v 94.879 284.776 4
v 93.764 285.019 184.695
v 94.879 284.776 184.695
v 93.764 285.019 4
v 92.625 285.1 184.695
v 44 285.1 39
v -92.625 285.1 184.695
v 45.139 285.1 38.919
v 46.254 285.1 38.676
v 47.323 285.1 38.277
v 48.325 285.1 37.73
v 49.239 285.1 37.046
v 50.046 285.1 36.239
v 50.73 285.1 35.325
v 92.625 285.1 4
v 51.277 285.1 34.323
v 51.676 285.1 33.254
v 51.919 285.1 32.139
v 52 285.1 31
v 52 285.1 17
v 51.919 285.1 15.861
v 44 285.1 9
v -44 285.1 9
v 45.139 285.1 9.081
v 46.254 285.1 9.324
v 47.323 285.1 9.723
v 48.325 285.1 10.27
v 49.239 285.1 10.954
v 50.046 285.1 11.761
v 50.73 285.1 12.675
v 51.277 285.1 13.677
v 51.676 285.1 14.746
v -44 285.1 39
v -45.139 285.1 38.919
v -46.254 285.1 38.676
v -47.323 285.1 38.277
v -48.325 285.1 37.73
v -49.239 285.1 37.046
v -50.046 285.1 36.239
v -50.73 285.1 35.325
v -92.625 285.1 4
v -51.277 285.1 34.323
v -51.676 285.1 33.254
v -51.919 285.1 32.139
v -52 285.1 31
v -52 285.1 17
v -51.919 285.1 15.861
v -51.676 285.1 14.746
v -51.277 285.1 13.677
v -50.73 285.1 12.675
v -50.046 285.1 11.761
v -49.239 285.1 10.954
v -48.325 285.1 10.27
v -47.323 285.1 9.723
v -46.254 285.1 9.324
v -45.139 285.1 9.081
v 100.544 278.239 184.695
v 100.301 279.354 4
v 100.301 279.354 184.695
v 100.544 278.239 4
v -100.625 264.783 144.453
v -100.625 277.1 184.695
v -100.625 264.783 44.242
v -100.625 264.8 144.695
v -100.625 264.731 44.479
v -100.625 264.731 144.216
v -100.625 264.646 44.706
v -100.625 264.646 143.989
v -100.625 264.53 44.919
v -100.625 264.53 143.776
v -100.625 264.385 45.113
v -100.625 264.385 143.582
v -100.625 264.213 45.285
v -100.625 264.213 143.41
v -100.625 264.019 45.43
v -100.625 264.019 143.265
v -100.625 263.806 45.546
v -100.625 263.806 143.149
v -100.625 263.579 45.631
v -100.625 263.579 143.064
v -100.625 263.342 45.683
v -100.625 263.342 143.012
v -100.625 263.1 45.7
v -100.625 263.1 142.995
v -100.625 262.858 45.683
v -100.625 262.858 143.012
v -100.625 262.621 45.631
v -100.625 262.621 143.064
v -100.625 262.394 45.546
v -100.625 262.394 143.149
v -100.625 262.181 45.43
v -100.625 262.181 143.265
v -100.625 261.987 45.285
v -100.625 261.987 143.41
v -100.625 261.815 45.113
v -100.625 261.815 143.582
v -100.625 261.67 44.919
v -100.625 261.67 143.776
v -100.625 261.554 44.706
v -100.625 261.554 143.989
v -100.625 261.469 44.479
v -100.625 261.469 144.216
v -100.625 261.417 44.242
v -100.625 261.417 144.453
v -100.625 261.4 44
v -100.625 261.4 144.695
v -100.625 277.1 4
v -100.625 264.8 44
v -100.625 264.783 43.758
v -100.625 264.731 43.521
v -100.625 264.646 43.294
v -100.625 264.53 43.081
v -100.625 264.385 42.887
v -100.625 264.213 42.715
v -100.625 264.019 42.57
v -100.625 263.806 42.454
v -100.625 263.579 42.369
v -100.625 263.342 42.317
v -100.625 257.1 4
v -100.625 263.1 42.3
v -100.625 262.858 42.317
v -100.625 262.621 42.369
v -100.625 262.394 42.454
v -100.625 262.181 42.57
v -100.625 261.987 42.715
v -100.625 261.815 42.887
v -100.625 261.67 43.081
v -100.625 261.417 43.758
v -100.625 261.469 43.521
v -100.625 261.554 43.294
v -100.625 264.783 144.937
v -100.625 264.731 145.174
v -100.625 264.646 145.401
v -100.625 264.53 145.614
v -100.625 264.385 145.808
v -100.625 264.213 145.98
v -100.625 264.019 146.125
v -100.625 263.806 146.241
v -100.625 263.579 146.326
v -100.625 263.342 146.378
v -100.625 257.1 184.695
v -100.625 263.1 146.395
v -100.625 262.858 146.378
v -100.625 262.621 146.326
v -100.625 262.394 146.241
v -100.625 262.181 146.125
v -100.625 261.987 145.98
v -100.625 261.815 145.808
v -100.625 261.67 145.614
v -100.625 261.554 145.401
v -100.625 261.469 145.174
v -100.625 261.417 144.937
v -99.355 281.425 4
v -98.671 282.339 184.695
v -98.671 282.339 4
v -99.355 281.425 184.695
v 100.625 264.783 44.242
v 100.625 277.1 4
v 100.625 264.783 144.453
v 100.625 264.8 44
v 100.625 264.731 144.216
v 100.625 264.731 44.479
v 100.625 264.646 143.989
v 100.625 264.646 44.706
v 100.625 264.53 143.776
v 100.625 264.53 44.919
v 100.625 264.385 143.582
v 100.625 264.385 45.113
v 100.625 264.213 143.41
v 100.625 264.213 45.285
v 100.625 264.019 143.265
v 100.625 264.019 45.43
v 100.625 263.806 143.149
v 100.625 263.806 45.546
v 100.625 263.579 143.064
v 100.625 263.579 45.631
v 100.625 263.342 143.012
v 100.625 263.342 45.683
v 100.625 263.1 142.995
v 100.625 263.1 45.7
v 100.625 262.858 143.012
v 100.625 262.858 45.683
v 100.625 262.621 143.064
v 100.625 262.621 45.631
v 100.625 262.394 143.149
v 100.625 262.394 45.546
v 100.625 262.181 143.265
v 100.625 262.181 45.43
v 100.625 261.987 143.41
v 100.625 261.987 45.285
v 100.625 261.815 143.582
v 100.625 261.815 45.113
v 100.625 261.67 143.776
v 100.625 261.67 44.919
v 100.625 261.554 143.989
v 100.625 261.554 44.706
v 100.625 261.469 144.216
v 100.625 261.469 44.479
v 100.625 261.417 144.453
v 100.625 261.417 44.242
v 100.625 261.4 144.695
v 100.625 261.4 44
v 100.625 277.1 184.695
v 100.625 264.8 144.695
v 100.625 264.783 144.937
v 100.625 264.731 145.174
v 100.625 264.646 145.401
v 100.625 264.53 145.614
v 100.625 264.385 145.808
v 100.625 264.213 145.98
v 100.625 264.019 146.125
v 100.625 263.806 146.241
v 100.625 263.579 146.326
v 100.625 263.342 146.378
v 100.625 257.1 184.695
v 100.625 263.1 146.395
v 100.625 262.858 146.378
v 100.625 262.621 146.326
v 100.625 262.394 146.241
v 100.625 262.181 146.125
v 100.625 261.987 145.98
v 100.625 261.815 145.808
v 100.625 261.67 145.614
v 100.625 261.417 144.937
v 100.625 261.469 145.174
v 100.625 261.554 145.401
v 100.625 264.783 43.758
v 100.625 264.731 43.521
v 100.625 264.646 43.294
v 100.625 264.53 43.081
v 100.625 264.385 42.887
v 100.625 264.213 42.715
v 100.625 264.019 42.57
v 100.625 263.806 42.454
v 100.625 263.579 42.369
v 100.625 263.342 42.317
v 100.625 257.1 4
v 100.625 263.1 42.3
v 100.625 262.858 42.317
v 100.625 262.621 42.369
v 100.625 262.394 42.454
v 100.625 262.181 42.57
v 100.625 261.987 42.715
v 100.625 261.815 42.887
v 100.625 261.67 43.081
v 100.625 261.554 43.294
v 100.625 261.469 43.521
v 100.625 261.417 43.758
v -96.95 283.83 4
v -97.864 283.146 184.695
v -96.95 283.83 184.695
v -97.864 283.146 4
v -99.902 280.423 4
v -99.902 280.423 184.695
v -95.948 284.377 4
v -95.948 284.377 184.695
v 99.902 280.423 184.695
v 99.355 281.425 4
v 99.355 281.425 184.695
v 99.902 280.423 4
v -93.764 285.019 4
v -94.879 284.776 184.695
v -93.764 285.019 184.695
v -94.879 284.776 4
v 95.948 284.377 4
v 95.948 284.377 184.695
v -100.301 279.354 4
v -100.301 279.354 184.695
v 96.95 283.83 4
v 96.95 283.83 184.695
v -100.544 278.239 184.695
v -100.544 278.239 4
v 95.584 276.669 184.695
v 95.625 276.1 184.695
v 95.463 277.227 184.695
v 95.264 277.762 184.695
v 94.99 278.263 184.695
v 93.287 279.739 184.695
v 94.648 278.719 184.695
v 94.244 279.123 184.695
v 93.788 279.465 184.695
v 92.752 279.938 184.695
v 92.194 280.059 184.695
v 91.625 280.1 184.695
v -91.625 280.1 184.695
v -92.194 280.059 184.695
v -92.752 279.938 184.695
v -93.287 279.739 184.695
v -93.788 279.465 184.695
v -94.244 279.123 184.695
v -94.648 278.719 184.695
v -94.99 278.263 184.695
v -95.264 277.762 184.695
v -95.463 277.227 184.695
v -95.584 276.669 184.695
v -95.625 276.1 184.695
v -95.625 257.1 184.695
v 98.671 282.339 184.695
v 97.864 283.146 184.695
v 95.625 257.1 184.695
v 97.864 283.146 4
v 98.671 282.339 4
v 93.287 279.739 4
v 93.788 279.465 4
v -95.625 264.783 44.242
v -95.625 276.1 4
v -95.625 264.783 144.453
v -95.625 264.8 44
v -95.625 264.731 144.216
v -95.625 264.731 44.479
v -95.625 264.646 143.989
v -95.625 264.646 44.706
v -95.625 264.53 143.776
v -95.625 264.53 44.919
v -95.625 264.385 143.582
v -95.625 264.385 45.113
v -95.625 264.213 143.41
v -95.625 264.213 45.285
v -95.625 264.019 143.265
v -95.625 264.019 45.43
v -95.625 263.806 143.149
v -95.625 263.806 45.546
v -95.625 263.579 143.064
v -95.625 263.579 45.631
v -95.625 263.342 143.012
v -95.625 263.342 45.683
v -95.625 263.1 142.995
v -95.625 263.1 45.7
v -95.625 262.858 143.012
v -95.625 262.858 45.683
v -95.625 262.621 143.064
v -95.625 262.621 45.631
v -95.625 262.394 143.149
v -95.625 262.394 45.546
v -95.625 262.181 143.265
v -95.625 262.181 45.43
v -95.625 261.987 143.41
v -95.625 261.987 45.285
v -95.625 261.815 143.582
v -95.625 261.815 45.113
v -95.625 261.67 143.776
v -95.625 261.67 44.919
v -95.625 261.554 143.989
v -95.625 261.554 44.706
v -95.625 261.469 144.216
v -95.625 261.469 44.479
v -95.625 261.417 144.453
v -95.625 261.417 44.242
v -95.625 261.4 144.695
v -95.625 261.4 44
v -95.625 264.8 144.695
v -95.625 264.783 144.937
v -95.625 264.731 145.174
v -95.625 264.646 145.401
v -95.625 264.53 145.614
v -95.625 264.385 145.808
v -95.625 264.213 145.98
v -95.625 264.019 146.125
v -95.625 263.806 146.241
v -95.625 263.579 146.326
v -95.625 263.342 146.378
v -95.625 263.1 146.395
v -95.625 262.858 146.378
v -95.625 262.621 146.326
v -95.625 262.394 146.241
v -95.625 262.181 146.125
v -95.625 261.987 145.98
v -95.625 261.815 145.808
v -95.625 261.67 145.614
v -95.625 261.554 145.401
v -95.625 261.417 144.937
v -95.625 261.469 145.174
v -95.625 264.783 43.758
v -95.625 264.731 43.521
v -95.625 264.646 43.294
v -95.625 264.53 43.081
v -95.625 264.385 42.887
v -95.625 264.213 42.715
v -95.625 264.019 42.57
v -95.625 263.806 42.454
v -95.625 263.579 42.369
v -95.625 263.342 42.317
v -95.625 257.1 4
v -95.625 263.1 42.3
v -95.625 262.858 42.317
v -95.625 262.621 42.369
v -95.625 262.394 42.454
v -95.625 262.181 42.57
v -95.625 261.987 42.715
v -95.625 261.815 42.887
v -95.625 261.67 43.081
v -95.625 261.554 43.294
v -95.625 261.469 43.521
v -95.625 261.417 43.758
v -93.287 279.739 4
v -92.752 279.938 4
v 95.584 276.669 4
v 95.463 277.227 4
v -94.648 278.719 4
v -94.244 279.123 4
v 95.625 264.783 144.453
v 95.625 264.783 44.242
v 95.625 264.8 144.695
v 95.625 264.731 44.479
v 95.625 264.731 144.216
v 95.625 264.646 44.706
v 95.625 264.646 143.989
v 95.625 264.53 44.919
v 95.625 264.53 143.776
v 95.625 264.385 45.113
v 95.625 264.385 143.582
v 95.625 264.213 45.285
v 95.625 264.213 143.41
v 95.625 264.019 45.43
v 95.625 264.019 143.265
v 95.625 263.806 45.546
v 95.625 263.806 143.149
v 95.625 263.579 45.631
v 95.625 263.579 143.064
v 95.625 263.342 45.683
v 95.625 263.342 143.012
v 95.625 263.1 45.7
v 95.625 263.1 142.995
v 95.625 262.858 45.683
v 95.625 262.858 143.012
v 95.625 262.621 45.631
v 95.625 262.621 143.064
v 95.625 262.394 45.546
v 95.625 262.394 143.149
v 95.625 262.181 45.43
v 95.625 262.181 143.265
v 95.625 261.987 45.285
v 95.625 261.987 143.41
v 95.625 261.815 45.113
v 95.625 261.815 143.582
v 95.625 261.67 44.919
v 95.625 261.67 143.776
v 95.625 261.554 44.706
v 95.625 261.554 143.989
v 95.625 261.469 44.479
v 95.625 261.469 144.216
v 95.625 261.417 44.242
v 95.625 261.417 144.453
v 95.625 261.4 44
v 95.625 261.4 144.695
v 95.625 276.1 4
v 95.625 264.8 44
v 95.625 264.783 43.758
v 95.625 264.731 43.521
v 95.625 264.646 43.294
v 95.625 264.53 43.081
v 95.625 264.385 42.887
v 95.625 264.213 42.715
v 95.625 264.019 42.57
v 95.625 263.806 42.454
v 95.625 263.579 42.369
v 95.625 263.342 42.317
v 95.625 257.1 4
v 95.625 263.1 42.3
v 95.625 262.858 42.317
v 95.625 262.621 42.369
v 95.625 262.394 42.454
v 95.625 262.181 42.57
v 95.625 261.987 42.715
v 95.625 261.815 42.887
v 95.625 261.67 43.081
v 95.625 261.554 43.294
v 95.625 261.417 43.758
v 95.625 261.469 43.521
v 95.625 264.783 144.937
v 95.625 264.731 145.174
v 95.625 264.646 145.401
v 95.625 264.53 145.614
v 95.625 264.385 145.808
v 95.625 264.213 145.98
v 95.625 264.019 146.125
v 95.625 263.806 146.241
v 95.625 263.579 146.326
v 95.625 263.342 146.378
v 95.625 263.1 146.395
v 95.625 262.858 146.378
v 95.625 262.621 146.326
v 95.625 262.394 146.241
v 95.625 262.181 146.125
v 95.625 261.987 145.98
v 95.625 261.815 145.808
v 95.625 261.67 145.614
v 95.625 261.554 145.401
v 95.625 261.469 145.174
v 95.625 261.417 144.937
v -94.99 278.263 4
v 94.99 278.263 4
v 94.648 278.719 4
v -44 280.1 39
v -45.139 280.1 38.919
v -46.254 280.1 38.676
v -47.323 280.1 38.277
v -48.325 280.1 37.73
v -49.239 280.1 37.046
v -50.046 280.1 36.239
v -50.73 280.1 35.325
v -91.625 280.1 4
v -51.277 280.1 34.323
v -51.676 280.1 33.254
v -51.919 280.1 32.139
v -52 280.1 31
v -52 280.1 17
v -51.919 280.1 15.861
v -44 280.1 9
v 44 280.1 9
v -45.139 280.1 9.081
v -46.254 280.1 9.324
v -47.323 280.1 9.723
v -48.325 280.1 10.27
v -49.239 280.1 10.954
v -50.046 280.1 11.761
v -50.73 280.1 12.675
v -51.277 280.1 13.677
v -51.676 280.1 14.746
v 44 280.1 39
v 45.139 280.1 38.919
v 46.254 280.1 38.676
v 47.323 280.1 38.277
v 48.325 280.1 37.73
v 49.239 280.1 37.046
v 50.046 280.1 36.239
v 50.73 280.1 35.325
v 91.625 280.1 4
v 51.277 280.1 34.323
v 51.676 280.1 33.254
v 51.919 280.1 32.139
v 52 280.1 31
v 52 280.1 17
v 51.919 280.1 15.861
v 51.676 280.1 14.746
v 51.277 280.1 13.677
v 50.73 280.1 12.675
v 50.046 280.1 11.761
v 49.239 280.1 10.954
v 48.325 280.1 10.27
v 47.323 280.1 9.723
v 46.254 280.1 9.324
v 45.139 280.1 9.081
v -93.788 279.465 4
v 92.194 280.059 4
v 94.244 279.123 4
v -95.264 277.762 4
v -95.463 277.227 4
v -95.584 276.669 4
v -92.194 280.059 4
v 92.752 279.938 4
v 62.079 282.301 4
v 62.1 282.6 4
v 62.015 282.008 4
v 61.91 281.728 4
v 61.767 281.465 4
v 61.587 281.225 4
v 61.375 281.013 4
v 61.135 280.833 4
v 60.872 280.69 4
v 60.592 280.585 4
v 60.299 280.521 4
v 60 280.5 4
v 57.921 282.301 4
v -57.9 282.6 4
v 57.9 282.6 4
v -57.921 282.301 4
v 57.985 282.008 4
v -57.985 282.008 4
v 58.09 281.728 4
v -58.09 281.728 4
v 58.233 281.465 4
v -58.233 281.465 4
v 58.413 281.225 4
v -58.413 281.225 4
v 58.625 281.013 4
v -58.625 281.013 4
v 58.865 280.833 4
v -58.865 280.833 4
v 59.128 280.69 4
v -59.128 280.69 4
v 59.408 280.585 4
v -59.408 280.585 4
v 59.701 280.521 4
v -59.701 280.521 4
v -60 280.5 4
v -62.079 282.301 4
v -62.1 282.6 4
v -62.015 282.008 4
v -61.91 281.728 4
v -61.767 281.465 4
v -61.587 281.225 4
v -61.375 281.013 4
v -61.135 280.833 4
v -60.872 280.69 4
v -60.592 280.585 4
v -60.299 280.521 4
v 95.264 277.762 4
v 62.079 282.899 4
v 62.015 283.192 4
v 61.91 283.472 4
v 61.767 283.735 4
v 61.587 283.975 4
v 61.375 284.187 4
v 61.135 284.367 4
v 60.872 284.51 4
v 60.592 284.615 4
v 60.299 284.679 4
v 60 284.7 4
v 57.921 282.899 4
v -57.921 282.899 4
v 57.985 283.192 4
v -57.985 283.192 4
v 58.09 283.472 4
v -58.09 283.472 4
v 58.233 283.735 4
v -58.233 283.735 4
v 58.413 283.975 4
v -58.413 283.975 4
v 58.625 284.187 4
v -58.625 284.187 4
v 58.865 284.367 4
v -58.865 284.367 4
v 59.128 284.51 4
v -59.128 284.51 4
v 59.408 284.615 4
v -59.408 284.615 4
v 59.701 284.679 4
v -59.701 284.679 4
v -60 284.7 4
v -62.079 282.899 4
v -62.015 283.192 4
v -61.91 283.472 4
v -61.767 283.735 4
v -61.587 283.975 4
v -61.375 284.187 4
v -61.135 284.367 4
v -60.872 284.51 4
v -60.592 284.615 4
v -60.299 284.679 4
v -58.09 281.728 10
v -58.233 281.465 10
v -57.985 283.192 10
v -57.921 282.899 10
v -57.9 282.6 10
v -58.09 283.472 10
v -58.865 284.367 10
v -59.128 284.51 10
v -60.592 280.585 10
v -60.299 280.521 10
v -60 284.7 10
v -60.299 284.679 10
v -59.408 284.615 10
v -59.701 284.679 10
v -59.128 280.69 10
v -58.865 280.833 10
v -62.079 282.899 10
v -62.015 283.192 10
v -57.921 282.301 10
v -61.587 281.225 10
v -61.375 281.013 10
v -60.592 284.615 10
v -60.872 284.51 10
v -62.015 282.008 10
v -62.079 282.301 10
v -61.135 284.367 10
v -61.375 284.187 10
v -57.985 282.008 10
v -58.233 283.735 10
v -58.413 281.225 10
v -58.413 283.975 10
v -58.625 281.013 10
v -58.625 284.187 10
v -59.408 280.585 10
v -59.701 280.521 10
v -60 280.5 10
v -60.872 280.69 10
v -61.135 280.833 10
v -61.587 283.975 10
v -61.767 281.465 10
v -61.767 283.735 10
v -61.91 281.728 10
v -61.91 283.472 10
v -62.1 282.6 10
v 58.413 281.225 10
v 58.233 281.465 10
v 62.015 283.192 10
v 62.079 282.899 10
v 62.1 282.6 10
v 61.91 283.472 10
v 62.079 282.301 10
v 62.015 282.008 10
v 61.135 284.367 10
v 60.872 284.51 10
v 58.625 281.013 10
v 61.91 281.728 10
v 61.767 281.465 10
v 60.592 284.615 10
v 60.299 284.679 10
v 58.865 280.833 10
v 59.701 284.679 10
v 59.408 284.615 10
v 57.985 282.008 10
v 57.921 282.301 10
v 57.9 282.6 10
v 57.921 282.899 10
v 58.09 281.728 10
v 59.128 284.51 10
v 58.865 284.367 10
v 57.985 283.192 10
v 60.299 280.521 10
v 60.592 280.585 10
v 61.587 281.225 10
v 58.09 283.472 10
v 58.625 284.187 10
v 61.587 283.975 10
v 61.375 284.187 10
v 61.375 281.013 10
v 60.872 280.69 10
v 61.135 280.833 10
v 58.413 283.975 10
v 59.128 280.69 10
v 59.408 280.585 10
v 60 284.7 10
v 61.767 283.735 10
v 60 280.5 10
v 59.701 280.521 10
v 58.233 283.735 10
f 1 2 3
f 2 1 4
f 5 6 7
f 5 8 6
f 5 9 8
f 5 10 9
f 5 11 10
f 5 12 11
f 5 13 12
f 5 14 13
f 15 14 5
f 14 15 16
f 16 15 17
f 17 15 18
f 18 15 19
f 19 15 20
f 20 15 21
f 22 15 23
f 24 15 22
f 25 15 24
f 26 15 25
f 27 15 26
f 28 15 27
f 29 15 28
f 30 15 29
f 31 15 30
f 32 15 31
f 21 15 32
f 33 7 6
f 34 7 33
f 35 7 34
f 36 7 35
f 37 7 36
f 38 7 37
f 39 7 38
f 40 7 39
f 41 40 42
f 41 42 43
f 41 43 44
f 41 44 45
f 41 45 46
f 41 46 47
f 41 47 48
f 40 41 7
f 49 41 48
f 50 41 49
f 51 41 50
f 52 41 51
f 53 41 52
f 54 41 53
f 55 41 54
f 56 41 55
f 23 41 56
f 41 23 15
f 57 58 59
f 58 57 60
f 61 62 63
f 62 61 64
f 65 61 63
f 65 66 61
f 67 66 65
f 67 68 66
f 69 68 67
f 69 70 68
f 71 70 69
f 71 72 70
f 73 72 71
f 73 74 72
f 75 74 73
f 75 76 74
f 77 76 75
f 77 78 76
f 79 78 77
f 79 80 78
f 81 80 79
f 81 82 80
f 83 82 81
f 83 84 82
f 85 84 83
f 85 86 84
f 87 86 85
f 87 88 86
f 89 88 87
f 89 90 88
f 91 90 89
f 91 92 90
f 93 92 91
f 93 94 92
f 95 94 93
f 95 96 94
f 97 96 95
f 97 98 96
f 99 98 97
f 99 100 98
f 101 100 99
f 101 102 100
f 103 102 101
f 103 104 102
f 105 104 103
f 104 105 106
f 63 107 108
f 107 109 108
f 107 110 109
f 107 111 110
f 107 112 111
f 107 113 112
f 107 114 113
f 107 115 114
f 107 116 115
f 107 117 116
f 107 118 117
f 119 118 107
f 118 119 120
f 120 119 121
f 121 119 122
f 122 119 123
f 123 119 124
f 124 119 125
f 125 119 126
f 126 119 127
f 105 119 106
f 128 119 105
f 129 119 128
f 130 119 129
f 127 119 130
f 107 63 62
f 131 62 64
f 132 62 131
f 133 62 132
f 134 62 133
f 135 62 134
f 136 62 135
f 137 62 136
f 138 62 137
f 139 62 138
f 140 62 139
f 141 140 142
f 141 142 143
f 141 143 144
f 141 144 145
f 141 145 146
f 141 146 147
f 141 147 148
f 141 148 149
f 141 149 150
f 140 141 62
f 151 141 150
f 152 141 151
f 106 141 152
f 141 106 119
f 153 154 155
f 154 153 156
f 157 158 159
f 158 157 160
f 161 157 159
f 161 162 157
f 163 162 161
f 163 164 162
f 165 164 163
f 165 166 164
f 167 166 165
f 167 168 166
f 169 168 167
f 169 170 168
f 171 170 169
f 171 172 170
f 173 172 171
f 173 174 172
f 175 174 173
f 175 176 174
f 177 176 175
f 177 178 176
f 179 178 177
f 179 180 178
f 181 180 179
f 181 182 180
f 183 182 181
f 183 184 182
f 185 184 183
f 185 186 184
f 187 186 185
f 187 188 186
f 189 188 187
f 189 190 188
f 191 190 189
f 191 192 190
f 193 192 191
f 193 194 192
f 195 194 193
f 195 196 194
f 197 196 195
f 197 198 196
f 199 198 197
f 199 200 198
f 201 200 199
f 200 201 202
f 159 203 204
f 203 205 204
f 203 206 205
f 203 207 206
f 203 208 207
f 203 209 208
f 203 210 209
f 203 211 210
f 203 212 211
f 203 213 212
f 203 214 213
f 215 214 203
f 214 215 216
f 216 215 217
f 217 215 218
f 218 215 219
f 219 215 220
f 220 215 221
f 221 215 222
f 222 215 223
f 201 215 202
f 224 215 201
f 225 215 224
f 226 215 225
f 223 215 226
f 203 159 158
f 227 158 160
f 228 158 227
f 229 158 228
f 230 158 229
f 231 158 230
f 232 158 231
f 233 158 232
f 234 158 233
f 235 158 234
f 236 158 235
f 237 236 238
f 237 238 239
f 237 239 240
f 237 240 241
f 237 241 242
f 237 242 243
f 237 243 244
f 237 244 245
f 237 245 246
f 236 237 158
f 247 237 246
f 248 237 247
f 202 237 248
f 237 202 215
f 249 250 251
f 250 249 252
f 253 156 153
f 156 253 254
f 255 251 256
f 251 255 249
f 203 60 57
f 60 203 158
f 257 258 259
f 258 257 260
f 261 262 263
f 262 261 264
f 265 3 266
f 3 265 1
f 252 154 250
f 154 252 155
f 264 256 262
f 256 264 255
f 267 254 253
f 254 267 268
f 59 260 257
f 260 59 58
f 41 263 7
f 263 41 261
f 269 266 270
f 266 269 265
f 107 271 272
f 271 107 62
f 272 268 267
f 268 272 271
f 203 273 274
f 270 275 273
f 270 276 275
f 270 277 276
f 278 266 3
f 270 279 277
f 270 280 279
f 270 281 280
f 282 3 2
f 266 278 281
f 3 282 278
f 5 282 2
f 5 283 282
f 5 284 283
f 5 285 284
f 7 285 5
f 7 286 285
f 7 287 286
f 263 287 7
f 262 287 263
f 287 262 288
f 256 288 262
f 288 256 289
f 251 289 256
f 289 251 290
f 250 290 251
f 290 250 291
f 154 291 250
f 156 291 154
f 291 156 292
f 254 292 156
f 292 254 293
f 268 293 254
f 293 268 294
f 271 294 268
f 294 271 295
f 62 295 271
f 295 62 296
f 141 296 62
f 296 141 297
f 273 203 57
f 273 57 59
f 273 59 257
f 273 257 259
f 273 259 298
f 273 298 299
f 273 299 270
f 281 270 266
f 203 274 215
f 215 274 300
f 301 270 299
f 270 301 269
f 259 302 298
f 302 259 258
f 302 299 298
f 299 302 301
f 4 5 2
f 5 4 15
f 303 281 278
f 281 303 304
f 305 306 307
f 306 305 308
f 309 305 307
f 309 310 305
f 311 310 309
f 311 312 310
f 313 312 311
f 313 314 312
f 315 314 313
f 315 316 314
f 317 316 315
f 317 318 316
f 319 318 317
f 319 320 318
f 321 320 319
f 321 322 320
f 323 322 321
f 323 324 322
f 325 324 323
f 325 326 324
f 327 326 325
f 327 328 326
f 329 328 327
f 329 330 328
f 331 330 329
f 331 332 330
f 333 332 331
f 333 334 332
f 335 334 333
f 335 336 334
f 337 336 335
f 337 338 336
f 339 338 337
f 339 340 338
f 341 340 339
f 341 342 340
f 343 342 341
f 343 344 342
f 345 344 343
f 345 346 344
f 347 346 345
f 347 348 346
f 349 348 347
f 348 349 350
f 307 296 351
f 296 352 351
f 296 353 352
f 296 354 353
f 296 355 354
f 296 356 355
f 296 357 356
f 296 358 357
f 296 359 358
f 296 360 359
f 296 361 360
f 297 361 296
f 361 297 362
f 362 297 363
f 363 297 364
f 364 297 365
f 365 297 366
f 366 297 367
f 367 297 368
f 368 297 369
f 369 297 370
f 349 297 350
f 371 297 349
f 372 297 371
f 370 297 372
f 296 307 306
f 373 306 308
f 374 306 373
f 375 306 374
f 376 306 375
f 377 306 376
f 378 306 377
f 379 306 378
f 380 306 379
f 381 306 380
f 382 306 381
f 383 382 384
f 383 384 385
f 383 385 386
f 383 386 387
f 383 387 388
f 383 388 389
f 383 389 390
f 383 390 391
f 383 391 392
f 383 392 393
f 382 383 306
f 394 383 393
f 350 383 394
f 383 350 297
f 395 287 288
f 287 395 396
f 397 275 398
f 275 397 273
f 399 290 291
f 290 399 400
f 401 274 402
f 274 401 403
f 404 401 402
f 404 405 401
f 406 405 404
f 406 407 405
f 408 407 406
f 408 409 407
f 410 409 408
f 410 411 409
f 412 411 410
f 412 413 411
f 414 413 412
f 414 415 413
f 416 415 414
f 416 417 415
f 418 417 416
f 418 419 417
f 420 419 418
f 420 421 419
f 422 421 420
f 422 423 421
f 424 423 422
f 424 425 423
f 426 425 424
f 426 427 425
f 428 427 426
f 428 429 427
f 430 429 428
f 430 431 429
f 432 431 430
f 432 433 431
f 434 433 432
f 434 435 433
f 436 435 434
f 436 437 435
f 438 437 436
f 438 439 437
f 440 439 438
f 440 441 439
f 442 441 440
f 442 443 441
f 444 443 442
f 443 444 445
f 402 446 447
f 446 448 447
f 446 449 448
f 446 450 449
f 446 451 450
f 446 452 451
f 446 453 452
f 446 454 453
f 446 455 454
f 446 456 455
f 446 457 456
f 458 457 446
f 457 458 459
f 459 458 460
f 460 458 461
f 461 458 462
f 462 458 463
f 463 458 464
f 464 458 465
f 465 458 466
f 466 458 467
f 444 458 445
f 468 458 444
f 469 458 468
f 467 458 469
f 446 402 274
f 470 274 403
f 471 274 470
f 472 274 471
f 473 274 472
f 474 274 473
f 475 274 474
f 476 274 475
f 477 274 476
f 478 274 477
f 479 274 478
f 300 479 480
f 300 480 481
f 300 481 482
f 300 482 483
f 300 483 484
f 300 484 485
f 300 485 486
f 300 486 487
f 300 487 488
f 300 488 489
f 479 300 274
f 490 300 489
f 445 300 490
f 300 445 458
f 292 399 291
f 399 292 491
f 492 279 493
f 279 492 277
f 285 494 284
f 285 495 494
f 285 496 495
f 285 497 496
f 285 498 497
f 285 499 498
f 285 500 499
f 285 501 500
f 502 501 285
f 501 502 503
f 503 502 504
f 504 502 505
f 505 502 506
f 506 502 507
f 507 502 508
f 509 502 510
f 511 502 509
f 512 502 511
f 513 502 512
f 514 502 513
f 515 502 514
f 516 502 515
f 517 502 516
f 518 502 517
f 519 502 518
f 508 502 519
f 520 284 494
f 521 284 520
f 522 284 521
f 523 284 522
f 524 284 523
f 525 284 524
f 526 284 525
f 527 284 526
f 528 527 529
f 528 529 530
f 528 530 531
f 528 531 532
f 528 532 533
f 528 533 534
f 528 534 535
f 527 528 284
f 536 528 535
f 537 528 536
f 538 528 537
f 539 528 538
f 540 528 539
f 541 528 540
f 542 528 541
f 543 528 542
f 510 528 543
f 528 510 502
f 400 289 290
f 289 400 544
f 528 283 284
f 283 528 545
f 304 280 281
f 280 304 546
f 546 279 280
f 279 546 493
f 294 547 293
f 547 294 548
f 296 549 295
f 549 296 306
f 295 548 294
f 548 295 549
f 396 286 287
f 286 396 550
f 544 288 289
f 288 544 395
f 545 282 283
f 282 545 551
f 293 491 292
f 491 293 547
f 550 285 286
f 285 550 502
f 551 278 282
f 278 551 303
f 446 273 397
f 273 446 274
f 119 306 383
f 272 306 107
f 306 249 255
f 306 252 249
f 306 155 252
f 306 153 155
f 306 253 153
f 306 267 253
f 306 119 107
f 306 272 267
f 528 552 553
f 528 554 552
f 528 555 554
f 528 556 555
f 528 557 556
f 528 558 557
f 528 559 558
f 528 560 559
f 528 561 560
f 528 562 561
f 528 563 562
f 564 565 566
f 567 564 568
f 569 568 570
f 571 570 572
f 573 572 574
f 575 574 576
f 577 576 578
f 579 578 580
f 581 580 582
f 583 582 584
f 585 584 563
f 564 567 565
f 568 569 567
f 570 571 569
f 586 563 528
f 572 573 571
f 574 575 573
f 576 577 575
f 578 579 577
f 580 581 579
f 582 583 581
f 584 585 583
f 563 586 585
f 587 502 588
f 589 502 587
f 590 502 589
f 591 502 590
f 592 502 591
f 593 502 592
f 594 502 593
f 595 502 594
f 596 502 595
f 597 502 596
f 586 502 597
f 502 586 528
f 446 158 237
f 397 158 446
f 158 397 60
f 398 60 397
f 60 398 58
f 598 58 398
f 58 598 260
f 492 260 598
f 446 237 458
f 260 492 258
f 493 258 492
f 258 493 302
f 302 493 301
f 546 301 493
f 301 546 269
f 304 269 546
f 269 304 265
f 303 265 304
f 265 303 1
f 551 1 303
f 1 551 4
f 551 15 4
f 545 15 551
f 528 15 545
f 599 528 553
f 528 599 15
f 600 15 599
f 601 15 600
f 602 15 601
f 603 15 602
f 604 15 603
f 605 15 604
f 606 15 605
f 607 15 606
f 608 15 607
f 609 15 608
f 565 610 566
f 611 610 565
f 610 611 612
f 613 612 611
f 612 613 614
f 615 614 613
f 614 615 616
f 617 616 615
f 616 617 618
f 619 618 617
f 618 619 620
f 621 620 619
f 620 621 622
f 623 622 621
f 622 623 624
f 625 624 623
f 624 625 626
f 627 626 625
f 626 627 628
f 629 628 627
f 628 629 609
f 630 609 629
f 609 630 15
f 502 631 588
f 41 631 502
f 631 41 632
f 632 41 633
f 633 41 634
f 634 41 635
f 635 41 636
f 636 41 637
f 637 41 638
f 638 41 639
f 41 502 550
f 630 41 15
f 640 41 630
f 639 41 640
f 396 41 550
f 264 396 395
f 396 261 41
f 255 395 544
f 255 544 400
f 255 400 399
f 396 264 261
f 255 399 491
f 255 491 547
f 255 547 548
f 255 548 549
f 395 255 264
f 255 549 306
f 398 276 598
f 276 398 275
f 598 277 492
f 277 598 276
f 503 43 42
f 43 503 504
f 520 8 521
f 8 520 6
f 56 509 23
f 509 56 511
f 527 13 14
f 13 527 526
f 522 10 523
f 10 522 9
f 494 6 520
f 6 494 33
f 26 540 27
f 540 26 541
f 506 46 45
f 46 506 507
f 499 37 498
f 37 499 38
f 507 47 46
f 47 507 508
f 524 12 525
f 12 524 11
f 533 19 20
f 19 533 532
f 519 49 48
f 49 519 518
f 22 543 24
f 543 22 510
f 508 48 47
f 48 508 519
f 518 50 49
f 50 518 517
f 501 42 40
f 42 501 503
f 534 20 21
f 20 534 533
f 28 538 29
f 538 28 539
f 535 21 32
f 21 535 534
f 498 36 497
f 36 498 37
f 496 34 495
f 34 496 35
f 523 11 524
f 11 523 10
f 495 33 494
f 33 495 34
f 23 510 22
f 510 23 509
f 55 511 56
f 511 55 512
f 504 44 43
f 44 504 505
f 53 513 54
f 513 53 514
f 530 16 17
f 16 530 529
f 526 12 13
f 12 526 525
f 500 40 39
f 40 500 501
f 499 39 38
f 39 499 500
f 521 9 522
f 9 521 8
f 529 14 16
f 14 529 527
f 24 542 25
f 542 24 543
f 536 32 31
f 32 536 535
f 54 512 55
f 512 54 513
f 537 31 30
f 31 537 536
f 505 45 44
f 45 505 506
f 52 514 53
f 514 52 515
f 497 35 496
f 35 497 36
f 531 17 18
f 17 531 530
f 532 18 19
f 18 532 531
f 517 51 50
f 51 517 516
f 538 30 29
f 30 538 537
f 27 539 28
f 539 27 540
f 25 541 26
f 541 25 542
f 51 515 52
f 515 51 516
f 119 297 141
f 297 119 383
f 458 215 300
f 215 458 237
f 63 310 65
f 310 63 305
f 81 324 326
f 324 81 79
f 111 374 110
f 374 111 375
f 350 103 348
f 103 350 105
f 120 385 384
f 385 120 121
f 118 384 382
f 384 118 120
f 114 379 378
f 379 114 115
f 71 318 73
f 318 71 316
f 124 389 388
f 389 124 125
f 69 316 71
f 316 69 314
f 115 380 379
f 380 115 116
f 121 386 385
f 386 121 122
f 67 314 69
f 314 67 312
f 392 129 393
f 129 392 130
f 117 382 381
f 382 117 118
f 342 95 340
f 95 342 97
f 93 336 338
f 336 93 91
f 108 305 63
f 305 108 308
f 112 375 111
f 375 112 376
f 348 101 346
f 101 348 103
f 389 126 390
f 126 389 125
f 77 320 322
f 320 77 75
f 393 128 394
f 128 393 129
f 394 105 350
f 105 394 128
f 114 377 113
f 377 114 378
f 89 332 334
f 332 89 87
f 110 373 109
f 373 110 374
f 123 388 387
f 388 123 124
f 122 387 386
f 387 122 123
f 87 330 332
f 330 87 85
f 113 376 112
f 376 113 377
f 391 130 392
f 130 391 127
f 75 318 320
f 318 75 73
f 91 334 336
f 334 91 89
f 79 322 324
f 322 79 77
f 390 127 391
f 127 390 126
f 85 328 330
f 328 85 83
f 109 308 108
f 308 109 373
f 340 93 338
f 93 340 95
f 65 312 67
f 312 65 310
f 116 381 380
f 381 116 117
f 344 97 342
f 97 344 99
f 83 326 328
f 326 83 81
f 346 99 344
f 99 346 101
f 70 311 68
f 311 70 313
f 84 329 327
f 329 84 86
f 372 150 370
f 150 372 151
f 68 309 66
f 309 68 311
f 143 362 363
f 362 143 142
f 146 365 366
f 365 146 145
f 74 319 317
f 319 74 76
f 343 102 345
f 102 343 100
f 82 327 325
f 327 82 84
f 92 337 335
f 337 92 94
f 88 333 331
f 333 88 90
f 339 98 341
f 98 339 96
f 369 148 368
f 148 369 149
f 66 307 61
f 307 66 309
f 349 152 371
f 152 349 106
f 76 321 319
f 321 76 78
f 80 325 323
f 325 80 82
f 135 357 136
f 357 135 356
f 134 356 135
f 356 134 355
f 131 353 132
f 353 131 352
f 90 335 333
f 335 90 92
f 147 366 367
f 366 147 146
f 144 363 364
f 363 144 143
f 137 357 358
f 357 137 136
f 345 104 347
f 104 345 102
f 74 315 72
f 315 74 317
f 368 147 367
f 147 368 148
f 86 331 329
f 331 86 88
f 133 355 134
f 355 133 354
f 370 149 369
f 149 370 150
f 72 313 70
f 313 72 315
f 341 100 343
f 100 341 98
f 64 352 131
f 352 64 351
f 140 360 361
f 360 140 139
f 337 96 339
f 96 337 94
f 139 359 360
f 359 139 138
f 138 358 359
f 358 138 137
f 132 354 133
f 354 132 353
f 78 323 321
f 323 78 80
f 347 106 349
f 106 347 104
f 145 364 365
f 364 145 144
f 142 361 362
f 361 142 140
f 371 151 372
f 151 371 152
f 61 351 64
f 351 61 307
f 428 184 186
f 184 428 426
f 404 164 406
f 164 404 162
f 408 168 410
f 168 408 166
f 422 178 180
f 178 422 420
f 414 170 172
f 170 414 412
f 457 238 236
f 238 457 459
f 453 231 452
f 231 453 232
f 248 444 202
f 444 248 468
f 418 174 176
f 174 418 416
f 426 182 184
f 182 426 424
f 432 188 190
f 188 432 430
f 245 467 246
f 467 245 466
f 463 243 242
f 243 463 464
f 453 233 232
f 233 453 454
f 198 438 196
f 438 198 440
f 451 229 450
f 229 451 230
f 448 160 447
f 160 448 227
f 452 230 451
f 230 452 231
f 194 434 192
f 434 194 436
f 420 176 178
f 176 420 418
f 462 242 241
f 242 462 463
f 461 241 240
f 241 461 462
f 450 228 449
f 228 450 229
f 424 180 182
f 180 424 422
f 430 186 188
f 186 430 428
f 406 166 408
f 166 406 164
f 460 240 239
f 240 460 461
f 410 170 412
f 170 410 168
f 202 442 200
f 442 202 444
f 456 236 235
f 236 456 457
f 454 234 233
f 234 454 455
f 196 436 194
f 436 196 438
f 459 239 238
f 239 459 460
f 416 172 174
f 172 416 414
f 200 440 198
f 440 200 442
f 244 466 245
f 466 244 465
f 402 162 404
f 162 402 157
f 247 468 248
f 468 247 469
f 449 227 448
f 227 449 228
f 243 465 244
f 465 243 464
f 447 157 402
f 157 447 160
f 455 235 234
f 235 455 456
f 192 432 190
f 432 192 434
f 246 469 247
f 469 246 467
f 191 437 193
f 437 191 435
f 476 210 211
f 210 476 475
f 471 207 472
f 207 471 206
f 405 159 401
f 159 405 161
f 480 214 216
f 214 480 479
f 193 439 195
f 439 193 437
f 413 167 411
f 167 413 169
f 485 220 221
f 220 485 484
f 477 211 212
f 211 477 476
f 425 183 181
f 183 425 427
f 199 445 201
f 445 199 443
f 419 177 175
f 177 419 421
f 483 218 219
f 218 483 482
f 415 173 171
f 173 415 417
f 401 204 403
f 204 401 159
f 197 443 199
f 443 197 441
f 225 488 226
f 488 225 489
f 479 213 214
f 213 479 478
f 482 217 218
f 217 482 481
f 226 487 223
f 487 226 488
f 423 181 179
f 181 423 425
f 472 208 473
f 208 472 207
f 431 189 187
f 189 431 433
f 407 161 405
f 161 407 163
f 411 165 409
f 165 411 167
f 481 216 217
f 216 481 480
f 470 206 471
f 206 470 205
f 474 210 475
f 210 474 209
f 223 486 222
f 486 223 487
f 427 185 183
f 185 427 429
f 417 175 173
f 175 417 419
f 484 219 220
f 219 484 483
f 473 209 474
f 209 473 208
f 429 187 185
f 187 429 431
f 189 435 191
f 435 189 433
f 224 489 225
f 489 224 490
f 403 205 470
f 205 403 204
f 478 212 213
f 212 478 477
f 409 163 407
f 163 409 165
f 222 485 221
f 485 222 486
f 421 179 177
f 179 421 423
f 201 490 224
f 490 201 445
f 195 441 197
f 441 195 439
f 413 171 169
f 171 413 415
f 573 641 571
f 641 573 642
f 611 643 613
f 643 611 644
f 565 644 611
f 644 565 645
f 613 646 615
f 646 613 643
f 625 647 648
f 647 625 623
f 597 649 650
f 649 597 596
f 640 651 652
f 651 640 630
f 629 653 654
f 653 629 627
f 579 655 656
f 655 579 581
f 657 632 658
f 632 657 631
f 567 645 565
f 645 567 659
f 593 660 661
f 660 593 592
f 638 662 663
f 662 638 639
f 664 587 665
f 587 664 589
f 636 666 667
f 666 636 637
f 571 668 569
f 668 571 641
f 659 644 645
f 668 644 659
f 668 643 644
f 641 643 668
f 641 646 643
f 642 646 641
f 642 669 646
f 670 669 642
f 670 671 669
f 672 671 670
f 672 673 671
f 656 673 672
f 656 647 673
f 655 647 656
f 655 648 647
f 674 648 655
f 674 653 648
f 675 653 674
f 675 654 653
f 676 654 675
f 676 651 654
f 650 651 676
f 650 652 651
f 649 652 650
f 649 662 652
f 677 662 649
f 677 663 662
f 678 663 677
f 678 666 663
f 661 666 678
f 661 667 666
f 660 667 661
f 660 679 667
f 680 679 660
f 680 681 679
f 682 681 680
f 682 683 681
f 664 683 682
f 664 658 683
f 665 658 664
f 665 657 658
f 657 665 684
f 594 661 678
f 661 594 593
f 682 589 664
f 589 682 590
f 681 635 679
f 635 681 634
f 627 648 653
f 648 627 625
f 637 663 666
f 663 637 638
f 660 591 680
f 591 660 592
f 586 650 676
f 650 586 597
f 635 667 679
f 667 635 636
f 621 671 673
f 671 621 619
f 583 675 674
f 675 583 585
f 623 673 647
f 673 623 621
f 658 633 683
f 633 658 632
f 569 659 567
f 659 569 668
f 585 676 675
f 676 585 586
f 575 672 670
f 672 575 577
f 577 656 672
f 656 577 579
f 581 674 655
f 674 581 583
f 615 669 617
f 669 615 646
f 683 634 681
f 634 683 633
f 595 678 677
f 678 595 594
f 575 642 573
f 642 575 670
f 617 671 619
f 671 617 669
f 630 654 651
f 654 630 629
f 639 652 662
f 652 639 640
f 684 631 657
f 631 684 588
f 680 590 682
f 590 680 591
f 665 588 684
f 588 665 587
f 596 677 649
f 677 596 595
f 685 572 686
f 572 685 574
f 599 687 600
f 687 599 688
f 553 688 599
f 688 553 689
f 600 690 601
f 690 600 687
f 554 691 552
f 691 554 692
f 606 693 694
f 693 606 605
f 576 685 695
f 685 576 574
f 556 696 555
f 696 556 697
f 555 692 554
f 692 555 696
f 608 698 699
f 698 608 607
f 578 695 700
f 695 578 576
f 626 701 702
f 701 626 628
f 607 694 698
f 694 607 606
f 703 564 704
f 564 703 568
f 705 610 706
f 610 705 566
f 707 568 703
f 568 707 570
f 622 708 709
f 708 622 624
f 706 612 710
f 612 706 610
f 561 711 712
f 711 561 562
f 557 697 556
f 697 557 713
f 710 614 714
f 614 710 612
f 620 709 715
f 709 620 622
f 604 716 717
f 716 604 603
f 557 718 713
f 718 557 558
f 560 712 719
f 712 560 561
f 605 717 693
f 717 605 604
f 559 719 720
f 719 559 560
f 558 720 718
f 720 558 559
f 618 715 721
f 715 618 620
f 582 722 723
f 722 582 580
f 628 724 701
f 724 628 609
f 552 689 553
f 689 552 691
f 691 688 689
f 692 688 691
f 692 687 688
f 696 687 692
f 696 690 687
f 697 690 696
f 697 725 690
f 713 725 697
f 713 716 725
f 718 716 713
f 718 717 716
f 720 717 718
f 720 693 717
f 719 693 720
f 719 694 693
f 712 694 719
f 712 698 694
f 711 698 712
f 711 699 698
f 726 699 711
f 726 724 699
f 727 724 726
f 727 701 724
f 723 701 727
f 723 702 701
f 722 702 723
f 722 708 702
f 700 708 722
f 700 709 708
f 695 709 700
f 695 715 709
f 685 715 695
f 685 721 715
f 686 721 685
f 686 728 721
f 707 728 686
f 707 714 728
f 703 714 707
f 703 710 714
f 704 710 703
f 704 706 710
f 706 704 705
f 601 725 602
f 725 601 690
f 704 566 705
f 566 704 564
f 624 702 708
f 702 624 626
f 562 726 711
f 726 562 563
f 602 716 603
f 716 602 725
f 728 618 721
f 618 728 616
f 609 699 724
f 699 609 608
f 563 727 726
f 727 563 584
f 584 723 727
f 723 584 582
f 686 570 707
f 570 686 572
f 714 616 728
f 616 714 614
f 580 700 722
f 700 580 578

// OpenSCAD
// box_body.scad v5.7
//  HANDHELD/ROVER RIG  v3.9  (EXACT base - do not change measurements)
$fn=44; eps=0.8; inch=25.4;
wall=5; floor_th=4; edge=8; win_r=6; clr=1.5; pt=2.5;
m3=3.4; cb_d=7; cb_h=2.5; boss_od=8; insert_h=6; ins_d=4.2;
plate_t=3; wash_d=8; wash_h=2.0;
nut_hex=6.6; nut_th=2.6; wcb_d=9; wcb_h=3;
ant_dx = 34;  ant_dz = 8;  ant_x = 0;
zed_w=175.25; zed_h=30.25; zed_d=43.1; zed_base=120;
rad_w=90; rad_h=102; rad_d=34; ant_win=32;
agx_w=105; agx_d=105; agx_h=65; agx_so=6; agx_mt=97;
jack_gap=42; rad_stick=3; rad_standoff=15;
zed_conn_w=40; zed_conn_h=22;
rad_hole_dx=76.30; rad_hole_dy=56.89;
cord_gap=63.5;
imu_cx=-60; imu_screw=2.4;
imu_hole_dx=22.86; imu_hole_dy=27.94;
half = max(zed_w/2, ant_dx + ant_x + rad_w/2) + edge; IW = 2*half; OW = IW + 2*wall;
agx_top=floor_th+agx_so+agx_h;
zed_z0=floor_th+10; zed_cz=zed_z0+zed_h/2;
rad_z0=zed_z0+zed_h+jack_gap; rad_cz=rad_z0+rad_h/2;
OH=rad_cz+(rad_hole_dy+22)/2+8;
zed_y0=wall; zed_back=zed_y0+zed_d; rad_back=-rad_stick+rad_d;
agx_rear=63.5;
agx_cy=zed_back+cord_gap+agx_d/2; OD=agx_cy+agx_d/2+agx_rear+wall;
rad_cx=ant_dx+ant_x;
hm_dz=46; handle_reach=95; hsec=18; grip_rise=52; grip_back=190;
handle_y=agx_cy-10; handle_z=OH*0.52;
module rbox(w,d,h,r=4){ hull() for(x=[r,w-r],y=[r,d-r]) translate([x,y,0]) cylinder(r=r,h=h); }
module holes4(dx,dy){ for(x=[-dx/2,dx/2],y=[-dy/2,dy/2]) translate([x,y,0]) children(); }
module ycut(w,h,depth,r){ hull() for(a=[-1,1],b=[-1,1]) translate([a*(w/2-r),0,b*(h/2-r)]) rotate([-90,0,0]) cylinder(r=r,h=depth); }
module shell(){ translate([-OW/2,0,0]) rbox(OW,OD,OH,8); }
module cavity(){ translate([-IW/2,wall,floor_th]) rbox(IW,OD-2*wall,OH+eps,4); }
module rad_window(){ translate([rad_cx,-eps,rad_cz]) ycut(rad_w+clr, rad_h+clr, wall+2*eps, 10); }
module rad_standoffs(){ translate([rad_cx, rad_back, rad_cz]) rotate([-90,0,0]) holes4(rad_hole_dx, rad_hole_dy)
        difference(){ cylinder(d=8,h=rad_standoff); translate([0,0,-eps]) cylinder(d=2.6,h=rad_standoff+2*eps); } }
module rad_plate(){ fh=rad_hole_dy+22; py=rad_back+rad_standoff;
    difference(){
        translate([-IW/2-2, py, rad_cz-fh/2]) cube([IW+4, plate_t, fh]);
        translate([rad_cx, py-eps, rad_cz]) rotate([-90,0,0]) holes4(rad_hole_dx,rad_hole_dy) cylinder(d=m3,h=plate_t+2*eps);
        translate([rad_cx, py+plate_t-wash_h, rad_cz]) rotate([-90,0,0]) holes4(rad_hole_dx,rad_hole_dy) cylinder(d=wash_d,h=wash_h+eps);
    } }
module imu_mount(){ translate([imu_cx,-eps,rad_cz]) rotate([-90,0,0]) holes4(imu_hole_dx,imu_hole_dy) cylinder(d=1.7,h=wall+2*eps);
    translate([imu_cx,-eps,rad_cz]) rotate([-90,0,0]) holes4(imu_hole_dx,imu_hole_dy) cylinder(d=wcb_d,h=wcb_h+eps); }
module zed_window(){ translate([0,-eps,zed_cz]) ycut(zed_base+44, zed_h-2, wall+2*eps, 6); }
zed_mt_dx=153.4; zed_mt_dz=14;
module zed_plate(){ fh=zed_h+18; py=zed_back;
    difference(){
        translate([-IW/2-2, py, zed_cz-fh/2]) cube([IW+4, plate_t, fh]);
        translate([-zed_conn_w/2, py-eps, zed_cz-zed_conn_h/2]) cube([zed_conn_w, plate_t+2*eps, zed_conn_h]);
        translate([0, py-eps, zed_cz]) rotate([-90,0,0]) holes4(zed_mt_dx, zed_mt_dz) cylinder(d=m3,h=plate_t+2*eps);
        translate([0, py+plate_t-wash_h, zed_cz]) rotate([-90,0,0]) holes4(zed_mt_dx, zed_mt_dz) cylinder(d=wash_d,h=wash_h+eps);
    } }
module agx_screws(){ translate([0,agx_cy,-eps]) holes4(agx_mt,agx_mt) cylinder(d=m3,h=floor_th+agx_so+2*eps);
                     translate([0,agx_cy,-eps]) holes4(agx_mt,agx_mt) cylinder(d=wcb_d,h=wcb_h); }
module agx_mount(){ translate([0,agx_cy,floor_th]) holes4(agx_mt,agx_mt) difference(){
        cylinder(d=boss_od,h=agx_so); translate([0,0,-1]) cylinder(d=2.6,h=agx_so+3); } }
module rear_cables(){ translate([0,OD-wall-eps,floor_th+20]) ycut(104,30,wall+2*eps,8); }
module handle_mounts(){ for(s=[-1,1]) for(dz=[-hm_dz/2,hm_dz/2]) translate([s*(OW/2+eps),handle_y,handle_z+dz]) rotate([0,-90*s,0]) cylinder(d=m3,h=wall+2*eps); }
module handle_nuts(){ for(s=[-1,1]) for(dz=[-hm_dz/2,hm_dz/2])
    translate([s*(IW/2),handle_y,handle_z+dz]) rotate([0,90*s,0]) difference(){
        cylinder(d=12,h=7); translate([0,0,-eps]) cylinder(d=m3,h=8);
        translate([0,0,7-nut_th]) cylinder(d=nut_hex,h=nut_th+1,$fn=6); } }
module box_body(){ union(){
        difference(){ shell(); cavity(); rad_window(); imu_mount(); zed_window(); rear_cables(); agx_screws(); handle_mounts(); }
        agx_mount(); handle_nuts(); rad_plate(); rad_standoffs(); zed_plate();
    } }
module handle(){ ft=6; fw=26; fh=hm_dz+34;
    difference(){ translate([0,-fw/2,-fh/2]) cube([ft,fw,fh]);
        for(dz=[-hm_dz/2,hm_dz/2]){ translate([-eps,0,dz]) rotate([0,90,0]) cylinder(d=m3,h=ft+2*eps);
            translate([ft-wcb_h,0,dz]) rotate([0,90,0]) cylinder(d=wcb_d,h=wcb_h+eps); } }
    translate([ft-1,-hsec/2,-hsec/2]) cube([handle_reach-ft+1, hsec, hsec]);
    translate([handle_reach-hsec,-hsec/2,-hsec/2]) cube([hsec, grip_back+hsec/2, hsec]);
    translate([handle_reach-hsec, grip_back-hsec/2,-hsec/2]) cube([hsec, hsec, grip_rise+hsec/2]); }
module handles(){ translate([55,0,0]) handle(); translate([-55,0,0]) mirror([1,0,0]) handle(); }

// ===================== SPLIT / BOLT-TOGETHER (v3.9 exact, sliced) =====================
jclr=3.4; jins=4.2; jins_h=6;                 // M3 screw + M3 heat-set insert
yfs=28; ybs=OD-28;                            // front/back seam (past r=8 corner)
zc=[floor_th+40, OH-40];                       // 2 corner screws per seam
tab_in=8; tab_ov=12;
xCL=-(OW/2-wall/2); xCR=(OW/2-wall/2);
rad_py=rad_back+rad_standoff;                  // 46
rad_pz=[rad_cz-30, rad_cz+30];
zed_pz=[zed_cz-11, zed_cz+11];
fp_front=[[-60,2.5],[60,2.5]]; fp_back=[[-60,OD-2.5],[60,OD-2.5]];
fp_left=[[xCL,70],[xCL,OD-70]]; fp_right=[[xCR,70],[xCR,OD-70]];

module wallsolid(){ union(){
    difference(){ shell(); cavity(); rad_window(); imu_mount(); zed_window(); rear_cables(); agx_screws(); handle_mounts(); }
    handle_nuts();
} }
module R_floor(){ translate([-OW,-20,-2]) cube([2*OW,OD+40,floor_th+2]); }
module R_front(){ translate([-OW,-20,floor_th]) cube([2*OW,yfs+20,OH+2]); }
module R_back(){  translate([-OW,ybs,floor_th]) cube([2*OW,OD-ybs+20,OH+2]); }
module R_left(){  translate([-OW-2,yfs,floor_th]) cube([OW+2,ybs-yfs,OH+2]); }
module R_right(){ translate([0,yfs,floor_th]) cube([OW+2,ybs-yfs,OH+2]); }
module Rside(s){ if(s<0) R_left(); else R_right(); }
module Xin(s,y,z,dia,len){ translate([s*OW/2,y,z]) rotate([0,-s*90,0]) cylinder(d=dia,h=len); }
module Zup(x,y,dia,len){ translate([x,y,floor_th-eps]) cylinder(d=dia,h=len); }
module Zdn(x,y,dia,len){ translate([x,y,-eps]) cylinder(d=dia,h=len); }

module corner_tab(s, yseam, ydir){
    xi=s*(OW/2-wall); xc=(s<0)? xi : xi-tab_in;
    y0=(ydir>0)? yseam-tab_ov : yseam;
    ym=(ydir>0)? yseam-tab_ov/2 : yseam+tab_ov/2;
    difference(){
        translate([xc, y0, floor_th]) cube([tab_in, tab_ov, OH-floor_th]);
        for(z=zc) translate([xi,ym,z]) rotate([0,-s*90,0]) cylinder(d=jins,h=tab_in+eps);
    }
}
module joins_floorclear(){ for(p=concat(fp_front,fp_back,fp_left,fp_right)){ Zdn(p[0],p[1],jclr,floor_th+2*eps); Zdn(p[0],p[1],wcb_d,wcb_h); } }

module p_floor(){ difference(){ union(){ intersection(){ wallsolid(); R_floor(); } agx_mount(); } joins_floorclear(); } }
module p_front(){ difference(){ intersection(){ wallsolid(); R_front(); }
    for(s=[-1,1],z=zc) Xin(s, yfs-tab_ov/2, z, jclr, wall+2*eps);
    for(p=fp_front) Zup(p[0],p[1],jins,jins_h+eps);
} }
module p_back(){ difference(){ intersection(){ wallsolid(); R_back(); }
    for(s=[-1,1],z=zc) Xin(s, ybs+tab_ov/2, z, jclr, wall+2*eps);
    for(p=fp_back) Zup(p[0],p[1],jins,jins_h+eps);
} }
module side(s){ difference(){
        union(){ intersection(){ wallsolid(); Rside(s); } corner_tab(s,yfs,+1); corner_tab(s,ybs,-1); }
        for(p=(s<0?fp_left:fp_right)) Zup(p[0],p[1],jins,jins_h+eps);
        for(z=rad_pz) Xin(s, rad_py+plate_t/2, z, jclr, wall+2*eps);
        for(z=zed_pz) Xin(s, zed_back+plate_t/2, z, jclr, wall+2*eps);
    } }
module p_left(){ side(-1); }
module p_right(){ side(1); }

// separate plates: IDENTICAL positions/holes, just IW-wide (fit between walls) + end inserts
module p_rad(){ fh=rad_hole_dy+22; py=rad_py; union(){
    difference(){
        translate([-IW/2, py, rad_cz-fh/2]) cube([IW, plate_t, fh]);
        translate([rad_cx, py-eps, rad_cz]) rotate([-90,0,0]) holes4(rad_hole_dx,rad_hole_dy) cylinder(d=2.8,h=plate_t+2*eps);   // smaller (M3 self-tap)
        for(s=[-1,1],z=rad_pz) translate([s*(IW/2)+(s<0?-eps:eps-jins_h), py+plate_t/2, z]) rotate([0,90,0]) cylinder(d=jins,h=jins_h+eps);
    }
    rad_standoffs();
} }
module p_zed(){ fh=zed_h+18; py=zed_back; difference(){
    translate([-IW/2, py, zed_cz-fh/2]) cube([IW, plate_t, fh]);
    translate([-zed_conn_w/2, py-eps, zed_cz-zed_conn_h/2]) cube([zed_conn_w, plate_t+2*eps, zed_conn_h]);
    translate([0, py-eps, zed_cz]) rotate([-90,0,0]) holes4(zed_mt_dx, zed_mt_dz) cylinder(d=3.2,h=plate_t+2*eps);   // smaller (snug M3)
    for(s=[-1,1],z=zed_pz) translate([s*(IW/2)+(s<0?-eps:eps-jins_h), py+plate_t/2, z]) rotate([0,90,0]) cylinder(d=jins,h=jins_h+eps);
} }

module split_assembly(){ p_floor(); p_front(); p_back(); p_left(); p_right(); p_rad(); p_zed();
    translate([ OW/2,handle_y,handle_z]) handle(); translate([-OW/2,handle_y,handle_z]) mirror([1,0,0]) handle(); }

part="back";
if      (part=="assembly")  split_assembly();
else if (part=="floor")     p_floor();
else if (part=="front")     p_front();
else if (part=="back")      p_back();
else if (part=="left")      p_left();
else if (part=="right")     p_right();
else if (part=="rad_plate") p_rad();
else if (part=="zed_plate") p_zed();
else if (part=="handles")   handles();
else if (part=="handle")    handle();
